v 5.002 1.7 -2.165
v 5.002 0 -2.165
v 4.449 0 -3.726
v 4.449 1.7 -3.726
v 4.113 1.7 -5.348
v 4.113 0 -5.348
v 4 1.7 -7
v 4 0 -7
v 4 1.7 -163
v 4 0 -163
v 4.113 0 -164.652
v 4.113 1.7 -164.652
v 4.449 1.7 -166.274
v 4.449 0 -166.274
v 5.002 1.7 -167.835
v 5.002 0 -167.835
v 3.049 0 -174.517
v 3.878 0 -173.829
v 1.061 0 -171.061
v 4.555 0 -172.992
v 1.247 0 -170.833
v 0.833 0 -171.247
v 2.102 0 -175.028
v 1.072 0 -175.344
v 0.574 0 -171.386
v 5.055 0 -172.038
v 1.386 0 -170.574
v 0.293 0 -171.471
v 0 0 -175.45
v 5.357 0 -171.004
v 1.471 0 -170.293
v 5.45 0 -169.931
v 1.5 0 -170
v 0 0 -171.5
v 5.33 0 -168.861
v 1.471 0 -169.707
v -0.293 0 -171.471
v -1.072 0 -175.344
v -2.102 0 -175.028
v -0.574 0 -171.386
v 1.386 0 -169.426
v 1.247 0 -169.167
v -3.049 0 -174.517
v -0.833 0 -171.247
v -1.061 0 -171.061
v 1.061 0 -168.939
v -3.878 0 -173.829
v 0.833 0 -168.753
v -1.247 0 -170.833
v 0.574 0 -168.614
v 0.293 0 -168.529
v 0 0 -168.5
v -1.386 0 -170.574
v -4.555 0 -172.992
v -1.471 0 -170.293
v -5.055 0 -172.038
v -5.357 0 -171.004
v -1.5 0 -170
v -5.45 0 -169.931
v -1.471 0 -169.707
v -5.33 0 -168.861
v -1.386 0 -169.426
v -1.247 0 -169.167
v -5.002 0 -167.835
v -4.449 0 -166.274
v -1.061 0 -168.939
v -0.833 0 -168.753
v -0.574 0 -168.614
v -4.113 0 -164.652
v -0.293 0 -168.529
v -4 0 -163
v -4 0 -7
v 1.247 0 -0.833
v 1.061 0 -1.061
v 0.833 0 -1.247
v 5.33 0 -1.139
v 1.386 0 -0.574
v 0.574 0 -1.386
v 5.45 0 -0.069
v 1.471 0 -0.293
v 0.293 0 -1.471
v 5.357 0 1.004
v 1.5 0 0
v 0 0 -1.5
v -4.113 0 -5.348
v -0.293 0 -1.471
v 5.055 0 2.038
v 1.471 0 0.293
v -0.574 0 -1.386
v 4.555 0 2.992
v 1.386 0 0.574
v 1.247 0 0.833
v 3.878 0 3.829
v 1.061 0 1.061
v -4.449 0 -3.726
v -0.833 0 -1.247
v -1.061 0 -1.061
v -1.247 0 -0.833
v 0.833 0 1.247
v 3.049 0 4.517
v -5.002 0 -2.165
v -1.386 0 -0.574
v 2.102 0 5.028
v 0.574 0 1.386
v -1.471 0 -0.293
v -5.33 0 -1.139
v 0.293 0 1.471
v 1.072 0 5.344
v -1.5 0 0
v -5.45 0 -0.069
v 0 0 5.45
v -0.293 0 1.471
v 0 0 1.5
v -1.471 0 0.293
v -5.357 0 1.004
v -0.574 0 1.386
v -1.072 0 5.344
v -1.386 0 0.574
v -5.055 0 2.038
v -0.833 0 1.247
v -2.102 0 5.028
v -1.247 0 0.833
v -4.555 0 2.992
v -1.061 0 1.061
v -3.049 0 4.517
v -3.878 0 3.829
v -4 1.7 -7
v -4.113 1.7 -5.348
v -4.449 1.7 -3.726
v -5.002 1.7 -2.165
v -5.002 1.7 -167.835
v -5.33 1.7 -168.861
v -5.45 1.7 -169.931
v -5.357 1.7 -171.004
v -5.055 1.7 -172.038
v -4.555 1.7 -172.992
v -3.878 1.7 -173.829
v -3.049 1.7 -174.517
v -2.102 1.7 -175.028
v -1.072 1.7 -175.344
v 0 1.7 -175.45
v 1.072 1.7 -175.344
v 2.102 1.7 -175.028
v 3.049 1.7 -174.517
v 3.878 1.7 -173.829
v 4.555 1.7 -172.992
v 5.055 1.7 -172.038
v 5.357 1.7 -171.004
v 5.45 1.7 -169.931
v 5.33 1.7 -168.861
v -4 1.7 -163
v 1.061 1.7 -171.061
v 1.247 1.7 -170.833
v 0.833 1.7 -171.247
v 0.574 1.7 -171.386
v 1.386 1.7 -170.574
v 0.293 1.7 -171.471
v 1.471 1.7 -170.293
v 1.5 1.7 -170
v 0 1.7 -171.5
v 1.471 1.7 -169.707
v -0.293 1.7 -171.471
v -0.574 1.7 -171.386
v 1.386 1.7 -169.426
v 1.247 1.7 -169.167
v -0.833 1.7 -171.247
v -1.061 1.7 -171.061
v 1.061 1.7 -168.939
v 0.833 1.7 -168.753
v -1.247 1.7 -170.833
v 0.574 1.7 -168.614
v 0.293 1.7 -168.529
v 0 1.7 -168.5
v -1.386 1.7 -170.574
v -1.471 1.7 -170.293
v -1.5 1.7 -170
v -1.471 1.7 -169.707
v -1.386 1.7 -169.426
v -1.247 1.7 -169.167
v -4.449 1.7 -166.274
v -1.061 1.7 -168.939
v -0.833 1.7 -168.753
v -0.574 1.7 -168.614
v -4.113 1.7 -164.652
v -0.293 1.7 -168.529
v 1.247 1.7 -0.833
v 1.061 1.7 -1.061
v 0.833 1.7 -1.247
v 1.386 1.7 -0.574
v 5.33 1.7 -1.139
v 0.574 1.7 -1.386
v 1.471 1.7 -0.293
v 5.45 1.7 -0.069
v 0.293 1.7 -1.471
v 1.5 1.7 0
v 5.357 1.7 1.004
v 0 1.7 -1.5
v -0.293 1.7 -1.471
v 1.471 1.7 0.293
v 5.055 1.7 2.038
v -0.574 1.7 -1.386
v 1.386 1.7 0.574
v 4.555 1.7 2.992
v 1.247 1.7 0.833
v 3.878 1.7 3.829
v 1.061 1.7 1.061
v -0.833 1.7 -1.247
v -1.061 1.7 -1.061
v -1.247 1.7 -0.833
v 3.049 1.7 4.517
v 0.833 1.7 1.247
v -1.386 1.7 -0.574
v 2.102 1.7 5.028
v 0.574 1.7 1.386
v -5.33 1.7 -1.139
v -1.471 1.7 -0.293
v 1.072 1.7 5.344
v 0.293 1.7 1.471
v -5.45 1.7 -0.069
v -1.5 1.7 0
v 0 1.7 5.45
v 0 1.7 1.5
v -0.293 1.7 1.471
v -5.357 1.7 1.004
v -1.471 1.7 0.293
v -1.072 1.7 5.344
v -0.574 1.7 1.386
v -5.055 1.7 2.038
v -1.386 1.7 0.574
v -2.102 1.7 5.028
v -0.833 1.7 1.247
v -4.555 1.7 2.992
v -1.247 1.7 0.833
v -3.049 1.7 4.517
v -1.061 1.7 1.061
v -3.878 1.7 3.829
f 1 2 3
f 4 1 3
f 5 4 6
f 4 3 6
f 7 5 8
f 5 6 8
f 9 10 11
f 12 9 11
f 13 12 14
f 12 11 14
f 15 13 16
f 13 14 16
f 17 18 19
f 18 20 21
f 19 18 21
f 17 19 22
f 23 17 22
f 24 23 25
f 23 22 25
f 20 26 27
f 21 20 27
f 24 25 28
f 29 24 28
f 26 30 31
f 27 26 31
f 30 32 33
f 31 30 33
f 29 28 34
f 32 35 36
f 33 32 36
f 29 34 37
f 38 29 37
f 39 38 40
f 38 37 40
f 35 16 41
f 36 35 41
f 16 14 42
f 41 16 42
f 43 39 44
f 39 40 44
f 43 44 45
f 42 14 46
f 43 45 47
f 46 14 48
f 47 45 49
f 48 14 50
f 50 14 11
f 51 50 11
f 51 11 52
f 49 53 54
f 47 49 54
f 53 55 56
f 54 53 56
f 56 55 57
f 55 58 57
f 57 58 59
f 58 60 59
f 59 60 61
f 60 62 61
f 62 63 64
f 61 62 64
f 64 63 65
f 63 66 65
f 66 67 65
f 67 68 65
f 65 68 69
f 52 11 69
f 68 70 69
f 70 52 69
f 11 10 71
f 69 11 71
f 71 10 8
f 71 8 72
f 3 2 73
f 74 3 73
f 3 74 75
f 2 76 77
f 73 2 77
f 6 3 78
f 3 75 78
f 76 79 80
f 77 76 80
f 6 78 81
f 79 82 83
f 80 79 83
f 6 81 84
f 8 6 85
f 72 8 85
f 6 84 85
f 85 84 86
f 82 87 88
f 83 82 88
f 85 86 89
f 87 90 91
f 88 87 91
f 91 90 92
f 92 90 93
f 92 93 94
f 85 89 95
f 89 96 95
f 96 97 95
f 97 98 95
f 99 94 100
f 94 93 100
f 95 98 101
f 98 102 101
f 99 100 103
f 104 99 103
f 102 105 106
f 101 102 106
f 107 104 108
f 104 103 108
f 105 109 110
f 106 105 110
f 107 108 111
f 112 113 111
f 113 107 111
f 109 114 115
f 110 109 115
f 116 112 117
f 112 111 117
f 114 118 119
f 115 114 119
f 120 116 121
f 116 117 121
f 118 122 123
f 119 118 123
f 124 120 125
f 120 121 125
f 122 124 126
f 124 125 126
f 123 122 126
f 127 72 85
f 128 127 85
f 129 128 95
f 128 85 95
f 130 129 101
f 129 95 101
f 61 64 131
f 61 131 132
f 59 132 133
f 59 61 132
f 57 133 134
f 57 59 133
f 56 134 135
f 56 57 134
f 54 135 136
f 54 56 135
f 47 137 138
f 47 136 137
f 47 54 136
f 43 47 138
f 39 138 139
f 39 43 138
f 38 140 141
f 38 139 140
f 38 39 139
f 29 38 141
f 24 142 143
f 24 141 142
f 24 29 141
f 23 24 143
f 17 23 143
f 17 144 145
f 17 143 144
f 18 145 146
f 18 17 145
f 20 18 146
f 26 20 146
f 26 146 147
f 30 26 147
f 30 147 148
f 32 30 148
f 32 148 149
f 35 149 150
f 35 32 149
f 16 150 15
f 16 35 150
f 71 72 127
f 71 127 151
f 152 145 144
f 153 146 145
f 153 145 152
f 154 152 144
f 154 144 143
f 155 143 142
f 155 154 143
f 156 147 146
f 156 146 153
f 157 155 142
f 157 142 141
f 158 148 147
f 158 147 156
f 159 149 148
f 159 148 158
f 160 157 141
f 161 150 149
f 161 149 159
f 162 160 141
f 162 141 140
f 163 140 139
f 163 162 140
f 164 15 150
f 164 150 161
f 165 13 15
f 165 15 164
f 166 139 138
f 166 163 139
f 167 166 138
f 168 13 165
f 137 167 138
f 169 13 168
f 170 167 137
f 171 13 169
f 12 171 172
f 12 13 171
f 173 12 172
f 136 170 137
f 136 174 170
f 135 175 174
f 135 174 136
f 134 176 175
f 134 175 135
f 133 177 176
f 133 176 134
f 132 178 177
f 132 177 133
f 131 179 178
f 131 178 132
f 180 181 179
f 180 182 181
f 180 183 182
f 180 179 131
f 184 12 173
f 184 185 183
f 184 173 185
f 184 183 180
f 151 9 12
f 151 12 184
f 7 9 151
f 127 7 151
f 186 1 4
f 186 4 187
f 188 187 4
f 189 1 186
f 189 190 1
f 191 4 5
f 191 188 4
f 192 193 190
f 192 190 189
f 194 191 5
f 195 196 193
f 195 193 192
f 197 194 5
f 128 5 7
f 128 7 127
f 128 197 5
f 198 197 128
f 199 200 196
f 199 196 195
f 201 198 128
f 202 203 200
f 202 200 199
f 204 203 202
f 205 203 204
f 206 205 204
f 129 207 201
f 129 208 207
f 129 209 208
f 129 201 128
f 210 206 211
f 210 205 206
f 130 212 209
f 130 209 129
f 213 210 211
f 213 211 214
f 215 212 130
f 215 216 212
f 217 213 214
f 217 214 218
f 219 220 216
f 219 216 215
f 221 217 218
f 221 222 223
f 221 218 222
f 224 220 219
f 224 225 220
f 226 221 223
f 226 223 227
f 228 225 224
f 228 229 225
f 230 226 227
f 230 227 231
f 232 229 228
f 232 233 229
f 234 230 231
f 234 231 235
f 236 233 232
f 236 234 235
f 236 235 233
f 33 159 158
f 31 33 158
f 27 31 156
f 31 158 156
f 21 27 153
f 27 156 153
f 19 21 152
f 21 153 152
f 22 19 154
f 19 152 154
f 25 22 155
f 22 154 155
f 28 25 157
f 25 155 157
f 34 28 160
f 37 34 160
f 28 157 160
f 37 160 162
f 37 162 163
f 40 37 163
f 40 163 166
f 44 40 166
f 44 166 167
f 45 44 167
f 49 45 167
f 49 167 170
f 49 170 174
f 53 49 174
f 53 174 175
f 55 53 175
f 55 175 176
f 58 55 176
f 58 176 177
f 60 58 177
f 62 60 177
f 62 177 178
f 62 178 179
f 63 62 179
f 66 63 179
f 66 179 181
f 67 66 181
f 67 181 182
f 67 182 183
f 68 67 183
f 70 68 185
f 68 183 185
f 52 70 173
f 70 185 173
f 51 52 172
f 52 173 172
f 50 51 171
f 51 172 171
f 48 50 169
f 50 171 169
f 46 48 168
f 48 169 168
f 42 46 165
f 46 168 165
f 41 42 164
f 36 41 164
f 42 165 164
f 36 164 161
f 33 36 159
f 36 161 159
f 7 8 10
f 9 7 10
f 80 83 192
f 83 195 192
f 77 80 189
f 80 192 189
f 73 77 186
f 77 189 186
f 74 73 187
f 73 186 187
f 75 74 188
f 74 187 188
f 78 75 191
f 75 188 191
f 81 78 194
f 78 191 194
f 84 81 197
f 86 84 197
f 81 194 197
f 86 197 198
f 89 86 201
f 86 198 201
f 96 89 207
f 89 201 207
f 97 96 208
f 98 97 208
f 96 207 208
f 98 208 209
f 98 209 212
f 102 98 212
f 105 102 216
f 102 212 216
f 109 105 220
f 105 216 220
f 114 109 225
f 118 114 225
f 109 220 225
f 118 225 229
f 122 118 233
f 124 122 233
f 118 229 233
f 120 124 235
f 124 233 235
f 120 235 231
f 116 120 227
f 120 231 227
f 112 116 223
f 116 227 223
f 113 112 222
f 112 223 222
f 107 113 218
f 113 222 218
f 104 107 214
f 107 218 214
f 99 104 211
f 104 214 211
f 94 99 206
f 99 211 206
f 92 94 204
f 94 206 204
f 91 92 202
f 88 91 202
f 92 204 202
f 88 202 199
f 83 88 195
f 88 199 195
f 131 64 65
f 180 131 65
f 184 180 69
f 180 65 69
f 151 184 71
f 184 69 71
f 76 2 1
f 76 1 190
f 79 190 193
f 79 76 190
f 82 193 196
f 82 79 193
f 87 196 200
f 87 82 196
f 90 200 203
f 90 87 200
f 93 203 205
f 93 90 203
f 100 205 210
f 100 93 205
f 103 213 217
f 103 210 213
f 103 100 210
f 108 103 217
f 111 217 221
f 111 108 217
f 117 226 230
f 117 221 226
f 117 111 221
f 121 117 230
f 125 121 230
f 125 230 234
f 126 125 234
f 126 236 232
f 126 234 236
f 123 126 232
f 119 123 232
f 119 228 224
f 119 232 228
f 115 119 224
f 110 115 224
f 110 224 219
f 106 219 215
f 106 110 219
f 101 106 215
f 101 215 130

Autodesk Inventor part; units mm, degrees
ref_plane "YZ Plane" through (0, 0, 0) normal (1, 0, 0) x (0, 1, 0)
ref_plane "XZ Plane" through (0, 0, 0) normal (0, 1, 0) x (-1, 0, 0)
ref_plane "XY Plane" through (0, 0, 0) normal (0, 0, 1) x (1, 0, 0)
sketch "Sketch1" plane through (0, 0, 0) normal (0, 1, 0) x (-1, 0, 0)
  arc A0 (5.0015, -2.165) -> (-5.0015, -2.165) centre (0, 0) ccw
  line L0 (4, -7) -> (4, -163)
  line L1 (-4, -7) -> (-4, -163)
  arc A1 (5.0015, -2.165) -> (4, -7) centre (16.1716, -7) ccw
  arc A2 (-4, -7) -> (-5.0015, -2.165) centre (-16.1716, -7) ccw
  arc A3 (-5.0015, -167.835) -> (5.0015, -167.835) centre (0, -170) ccw
  arc A4 (4, -163) -> (5.0015, -167.835) centre (16.1716, -163) ccw
  arc A5 (-5.0015, -167.835) -> (-4, -163) centre (-16.1716, -163) ccw
  dimension "d0" = 10.9
  dimension "d4" = 4
  dimension "d5" = 4
  dimension "d6" = 0
  dimension "d7" = 10.9
  dimension "d8" = 170
  dimension "d9" = 0
  dimension "d10" = 7
  dimension "d12" = 4
  dimension "d13" = 7
extrude "Extrusion1" add sketch "Sketch1" along normal blind 1.7
sketch "Sketch2" plane through (0, 1.7, 0) normal (0, 1, 0) x (1, 0, 0)
  arc A0 (5.0015, 167.835) -> (-5.0015, 167.835) centre (0, 170) ccw projected
  arc A1 (-5.0015, 2.165) -> (5.0015, 2.165) centre (0, 0) ccw projected
  circle A2 centre (0, 0) radius 1.5
  circle A3 centre (0, 170) radius 1.5
  dimension "d16" = 3
  dimension "d17" = 3
extrude "Extrusion2" cut sketch "Sketch2" against normal blind 1.7
equation "\"BendRadius\" = Thickness"
equation "\"BendReliefWidth\" = Thickness"
equation "\"BendReliefDepth\" = 0.5 * Thickness"
equation "\"CornerReliefSize\" = 4 * Thickness"
equation "\"MinimumRemnant\" = 2 * Thickness"
equation "\"TransitionRadius\" = BendRadius"
equation "\"JacobiRadiusSize\" = BendRadius"
equation "\"GapSize\" = Thickness"
equation "\"Thickness\" = 3.048"
properties part number "A2P1"
